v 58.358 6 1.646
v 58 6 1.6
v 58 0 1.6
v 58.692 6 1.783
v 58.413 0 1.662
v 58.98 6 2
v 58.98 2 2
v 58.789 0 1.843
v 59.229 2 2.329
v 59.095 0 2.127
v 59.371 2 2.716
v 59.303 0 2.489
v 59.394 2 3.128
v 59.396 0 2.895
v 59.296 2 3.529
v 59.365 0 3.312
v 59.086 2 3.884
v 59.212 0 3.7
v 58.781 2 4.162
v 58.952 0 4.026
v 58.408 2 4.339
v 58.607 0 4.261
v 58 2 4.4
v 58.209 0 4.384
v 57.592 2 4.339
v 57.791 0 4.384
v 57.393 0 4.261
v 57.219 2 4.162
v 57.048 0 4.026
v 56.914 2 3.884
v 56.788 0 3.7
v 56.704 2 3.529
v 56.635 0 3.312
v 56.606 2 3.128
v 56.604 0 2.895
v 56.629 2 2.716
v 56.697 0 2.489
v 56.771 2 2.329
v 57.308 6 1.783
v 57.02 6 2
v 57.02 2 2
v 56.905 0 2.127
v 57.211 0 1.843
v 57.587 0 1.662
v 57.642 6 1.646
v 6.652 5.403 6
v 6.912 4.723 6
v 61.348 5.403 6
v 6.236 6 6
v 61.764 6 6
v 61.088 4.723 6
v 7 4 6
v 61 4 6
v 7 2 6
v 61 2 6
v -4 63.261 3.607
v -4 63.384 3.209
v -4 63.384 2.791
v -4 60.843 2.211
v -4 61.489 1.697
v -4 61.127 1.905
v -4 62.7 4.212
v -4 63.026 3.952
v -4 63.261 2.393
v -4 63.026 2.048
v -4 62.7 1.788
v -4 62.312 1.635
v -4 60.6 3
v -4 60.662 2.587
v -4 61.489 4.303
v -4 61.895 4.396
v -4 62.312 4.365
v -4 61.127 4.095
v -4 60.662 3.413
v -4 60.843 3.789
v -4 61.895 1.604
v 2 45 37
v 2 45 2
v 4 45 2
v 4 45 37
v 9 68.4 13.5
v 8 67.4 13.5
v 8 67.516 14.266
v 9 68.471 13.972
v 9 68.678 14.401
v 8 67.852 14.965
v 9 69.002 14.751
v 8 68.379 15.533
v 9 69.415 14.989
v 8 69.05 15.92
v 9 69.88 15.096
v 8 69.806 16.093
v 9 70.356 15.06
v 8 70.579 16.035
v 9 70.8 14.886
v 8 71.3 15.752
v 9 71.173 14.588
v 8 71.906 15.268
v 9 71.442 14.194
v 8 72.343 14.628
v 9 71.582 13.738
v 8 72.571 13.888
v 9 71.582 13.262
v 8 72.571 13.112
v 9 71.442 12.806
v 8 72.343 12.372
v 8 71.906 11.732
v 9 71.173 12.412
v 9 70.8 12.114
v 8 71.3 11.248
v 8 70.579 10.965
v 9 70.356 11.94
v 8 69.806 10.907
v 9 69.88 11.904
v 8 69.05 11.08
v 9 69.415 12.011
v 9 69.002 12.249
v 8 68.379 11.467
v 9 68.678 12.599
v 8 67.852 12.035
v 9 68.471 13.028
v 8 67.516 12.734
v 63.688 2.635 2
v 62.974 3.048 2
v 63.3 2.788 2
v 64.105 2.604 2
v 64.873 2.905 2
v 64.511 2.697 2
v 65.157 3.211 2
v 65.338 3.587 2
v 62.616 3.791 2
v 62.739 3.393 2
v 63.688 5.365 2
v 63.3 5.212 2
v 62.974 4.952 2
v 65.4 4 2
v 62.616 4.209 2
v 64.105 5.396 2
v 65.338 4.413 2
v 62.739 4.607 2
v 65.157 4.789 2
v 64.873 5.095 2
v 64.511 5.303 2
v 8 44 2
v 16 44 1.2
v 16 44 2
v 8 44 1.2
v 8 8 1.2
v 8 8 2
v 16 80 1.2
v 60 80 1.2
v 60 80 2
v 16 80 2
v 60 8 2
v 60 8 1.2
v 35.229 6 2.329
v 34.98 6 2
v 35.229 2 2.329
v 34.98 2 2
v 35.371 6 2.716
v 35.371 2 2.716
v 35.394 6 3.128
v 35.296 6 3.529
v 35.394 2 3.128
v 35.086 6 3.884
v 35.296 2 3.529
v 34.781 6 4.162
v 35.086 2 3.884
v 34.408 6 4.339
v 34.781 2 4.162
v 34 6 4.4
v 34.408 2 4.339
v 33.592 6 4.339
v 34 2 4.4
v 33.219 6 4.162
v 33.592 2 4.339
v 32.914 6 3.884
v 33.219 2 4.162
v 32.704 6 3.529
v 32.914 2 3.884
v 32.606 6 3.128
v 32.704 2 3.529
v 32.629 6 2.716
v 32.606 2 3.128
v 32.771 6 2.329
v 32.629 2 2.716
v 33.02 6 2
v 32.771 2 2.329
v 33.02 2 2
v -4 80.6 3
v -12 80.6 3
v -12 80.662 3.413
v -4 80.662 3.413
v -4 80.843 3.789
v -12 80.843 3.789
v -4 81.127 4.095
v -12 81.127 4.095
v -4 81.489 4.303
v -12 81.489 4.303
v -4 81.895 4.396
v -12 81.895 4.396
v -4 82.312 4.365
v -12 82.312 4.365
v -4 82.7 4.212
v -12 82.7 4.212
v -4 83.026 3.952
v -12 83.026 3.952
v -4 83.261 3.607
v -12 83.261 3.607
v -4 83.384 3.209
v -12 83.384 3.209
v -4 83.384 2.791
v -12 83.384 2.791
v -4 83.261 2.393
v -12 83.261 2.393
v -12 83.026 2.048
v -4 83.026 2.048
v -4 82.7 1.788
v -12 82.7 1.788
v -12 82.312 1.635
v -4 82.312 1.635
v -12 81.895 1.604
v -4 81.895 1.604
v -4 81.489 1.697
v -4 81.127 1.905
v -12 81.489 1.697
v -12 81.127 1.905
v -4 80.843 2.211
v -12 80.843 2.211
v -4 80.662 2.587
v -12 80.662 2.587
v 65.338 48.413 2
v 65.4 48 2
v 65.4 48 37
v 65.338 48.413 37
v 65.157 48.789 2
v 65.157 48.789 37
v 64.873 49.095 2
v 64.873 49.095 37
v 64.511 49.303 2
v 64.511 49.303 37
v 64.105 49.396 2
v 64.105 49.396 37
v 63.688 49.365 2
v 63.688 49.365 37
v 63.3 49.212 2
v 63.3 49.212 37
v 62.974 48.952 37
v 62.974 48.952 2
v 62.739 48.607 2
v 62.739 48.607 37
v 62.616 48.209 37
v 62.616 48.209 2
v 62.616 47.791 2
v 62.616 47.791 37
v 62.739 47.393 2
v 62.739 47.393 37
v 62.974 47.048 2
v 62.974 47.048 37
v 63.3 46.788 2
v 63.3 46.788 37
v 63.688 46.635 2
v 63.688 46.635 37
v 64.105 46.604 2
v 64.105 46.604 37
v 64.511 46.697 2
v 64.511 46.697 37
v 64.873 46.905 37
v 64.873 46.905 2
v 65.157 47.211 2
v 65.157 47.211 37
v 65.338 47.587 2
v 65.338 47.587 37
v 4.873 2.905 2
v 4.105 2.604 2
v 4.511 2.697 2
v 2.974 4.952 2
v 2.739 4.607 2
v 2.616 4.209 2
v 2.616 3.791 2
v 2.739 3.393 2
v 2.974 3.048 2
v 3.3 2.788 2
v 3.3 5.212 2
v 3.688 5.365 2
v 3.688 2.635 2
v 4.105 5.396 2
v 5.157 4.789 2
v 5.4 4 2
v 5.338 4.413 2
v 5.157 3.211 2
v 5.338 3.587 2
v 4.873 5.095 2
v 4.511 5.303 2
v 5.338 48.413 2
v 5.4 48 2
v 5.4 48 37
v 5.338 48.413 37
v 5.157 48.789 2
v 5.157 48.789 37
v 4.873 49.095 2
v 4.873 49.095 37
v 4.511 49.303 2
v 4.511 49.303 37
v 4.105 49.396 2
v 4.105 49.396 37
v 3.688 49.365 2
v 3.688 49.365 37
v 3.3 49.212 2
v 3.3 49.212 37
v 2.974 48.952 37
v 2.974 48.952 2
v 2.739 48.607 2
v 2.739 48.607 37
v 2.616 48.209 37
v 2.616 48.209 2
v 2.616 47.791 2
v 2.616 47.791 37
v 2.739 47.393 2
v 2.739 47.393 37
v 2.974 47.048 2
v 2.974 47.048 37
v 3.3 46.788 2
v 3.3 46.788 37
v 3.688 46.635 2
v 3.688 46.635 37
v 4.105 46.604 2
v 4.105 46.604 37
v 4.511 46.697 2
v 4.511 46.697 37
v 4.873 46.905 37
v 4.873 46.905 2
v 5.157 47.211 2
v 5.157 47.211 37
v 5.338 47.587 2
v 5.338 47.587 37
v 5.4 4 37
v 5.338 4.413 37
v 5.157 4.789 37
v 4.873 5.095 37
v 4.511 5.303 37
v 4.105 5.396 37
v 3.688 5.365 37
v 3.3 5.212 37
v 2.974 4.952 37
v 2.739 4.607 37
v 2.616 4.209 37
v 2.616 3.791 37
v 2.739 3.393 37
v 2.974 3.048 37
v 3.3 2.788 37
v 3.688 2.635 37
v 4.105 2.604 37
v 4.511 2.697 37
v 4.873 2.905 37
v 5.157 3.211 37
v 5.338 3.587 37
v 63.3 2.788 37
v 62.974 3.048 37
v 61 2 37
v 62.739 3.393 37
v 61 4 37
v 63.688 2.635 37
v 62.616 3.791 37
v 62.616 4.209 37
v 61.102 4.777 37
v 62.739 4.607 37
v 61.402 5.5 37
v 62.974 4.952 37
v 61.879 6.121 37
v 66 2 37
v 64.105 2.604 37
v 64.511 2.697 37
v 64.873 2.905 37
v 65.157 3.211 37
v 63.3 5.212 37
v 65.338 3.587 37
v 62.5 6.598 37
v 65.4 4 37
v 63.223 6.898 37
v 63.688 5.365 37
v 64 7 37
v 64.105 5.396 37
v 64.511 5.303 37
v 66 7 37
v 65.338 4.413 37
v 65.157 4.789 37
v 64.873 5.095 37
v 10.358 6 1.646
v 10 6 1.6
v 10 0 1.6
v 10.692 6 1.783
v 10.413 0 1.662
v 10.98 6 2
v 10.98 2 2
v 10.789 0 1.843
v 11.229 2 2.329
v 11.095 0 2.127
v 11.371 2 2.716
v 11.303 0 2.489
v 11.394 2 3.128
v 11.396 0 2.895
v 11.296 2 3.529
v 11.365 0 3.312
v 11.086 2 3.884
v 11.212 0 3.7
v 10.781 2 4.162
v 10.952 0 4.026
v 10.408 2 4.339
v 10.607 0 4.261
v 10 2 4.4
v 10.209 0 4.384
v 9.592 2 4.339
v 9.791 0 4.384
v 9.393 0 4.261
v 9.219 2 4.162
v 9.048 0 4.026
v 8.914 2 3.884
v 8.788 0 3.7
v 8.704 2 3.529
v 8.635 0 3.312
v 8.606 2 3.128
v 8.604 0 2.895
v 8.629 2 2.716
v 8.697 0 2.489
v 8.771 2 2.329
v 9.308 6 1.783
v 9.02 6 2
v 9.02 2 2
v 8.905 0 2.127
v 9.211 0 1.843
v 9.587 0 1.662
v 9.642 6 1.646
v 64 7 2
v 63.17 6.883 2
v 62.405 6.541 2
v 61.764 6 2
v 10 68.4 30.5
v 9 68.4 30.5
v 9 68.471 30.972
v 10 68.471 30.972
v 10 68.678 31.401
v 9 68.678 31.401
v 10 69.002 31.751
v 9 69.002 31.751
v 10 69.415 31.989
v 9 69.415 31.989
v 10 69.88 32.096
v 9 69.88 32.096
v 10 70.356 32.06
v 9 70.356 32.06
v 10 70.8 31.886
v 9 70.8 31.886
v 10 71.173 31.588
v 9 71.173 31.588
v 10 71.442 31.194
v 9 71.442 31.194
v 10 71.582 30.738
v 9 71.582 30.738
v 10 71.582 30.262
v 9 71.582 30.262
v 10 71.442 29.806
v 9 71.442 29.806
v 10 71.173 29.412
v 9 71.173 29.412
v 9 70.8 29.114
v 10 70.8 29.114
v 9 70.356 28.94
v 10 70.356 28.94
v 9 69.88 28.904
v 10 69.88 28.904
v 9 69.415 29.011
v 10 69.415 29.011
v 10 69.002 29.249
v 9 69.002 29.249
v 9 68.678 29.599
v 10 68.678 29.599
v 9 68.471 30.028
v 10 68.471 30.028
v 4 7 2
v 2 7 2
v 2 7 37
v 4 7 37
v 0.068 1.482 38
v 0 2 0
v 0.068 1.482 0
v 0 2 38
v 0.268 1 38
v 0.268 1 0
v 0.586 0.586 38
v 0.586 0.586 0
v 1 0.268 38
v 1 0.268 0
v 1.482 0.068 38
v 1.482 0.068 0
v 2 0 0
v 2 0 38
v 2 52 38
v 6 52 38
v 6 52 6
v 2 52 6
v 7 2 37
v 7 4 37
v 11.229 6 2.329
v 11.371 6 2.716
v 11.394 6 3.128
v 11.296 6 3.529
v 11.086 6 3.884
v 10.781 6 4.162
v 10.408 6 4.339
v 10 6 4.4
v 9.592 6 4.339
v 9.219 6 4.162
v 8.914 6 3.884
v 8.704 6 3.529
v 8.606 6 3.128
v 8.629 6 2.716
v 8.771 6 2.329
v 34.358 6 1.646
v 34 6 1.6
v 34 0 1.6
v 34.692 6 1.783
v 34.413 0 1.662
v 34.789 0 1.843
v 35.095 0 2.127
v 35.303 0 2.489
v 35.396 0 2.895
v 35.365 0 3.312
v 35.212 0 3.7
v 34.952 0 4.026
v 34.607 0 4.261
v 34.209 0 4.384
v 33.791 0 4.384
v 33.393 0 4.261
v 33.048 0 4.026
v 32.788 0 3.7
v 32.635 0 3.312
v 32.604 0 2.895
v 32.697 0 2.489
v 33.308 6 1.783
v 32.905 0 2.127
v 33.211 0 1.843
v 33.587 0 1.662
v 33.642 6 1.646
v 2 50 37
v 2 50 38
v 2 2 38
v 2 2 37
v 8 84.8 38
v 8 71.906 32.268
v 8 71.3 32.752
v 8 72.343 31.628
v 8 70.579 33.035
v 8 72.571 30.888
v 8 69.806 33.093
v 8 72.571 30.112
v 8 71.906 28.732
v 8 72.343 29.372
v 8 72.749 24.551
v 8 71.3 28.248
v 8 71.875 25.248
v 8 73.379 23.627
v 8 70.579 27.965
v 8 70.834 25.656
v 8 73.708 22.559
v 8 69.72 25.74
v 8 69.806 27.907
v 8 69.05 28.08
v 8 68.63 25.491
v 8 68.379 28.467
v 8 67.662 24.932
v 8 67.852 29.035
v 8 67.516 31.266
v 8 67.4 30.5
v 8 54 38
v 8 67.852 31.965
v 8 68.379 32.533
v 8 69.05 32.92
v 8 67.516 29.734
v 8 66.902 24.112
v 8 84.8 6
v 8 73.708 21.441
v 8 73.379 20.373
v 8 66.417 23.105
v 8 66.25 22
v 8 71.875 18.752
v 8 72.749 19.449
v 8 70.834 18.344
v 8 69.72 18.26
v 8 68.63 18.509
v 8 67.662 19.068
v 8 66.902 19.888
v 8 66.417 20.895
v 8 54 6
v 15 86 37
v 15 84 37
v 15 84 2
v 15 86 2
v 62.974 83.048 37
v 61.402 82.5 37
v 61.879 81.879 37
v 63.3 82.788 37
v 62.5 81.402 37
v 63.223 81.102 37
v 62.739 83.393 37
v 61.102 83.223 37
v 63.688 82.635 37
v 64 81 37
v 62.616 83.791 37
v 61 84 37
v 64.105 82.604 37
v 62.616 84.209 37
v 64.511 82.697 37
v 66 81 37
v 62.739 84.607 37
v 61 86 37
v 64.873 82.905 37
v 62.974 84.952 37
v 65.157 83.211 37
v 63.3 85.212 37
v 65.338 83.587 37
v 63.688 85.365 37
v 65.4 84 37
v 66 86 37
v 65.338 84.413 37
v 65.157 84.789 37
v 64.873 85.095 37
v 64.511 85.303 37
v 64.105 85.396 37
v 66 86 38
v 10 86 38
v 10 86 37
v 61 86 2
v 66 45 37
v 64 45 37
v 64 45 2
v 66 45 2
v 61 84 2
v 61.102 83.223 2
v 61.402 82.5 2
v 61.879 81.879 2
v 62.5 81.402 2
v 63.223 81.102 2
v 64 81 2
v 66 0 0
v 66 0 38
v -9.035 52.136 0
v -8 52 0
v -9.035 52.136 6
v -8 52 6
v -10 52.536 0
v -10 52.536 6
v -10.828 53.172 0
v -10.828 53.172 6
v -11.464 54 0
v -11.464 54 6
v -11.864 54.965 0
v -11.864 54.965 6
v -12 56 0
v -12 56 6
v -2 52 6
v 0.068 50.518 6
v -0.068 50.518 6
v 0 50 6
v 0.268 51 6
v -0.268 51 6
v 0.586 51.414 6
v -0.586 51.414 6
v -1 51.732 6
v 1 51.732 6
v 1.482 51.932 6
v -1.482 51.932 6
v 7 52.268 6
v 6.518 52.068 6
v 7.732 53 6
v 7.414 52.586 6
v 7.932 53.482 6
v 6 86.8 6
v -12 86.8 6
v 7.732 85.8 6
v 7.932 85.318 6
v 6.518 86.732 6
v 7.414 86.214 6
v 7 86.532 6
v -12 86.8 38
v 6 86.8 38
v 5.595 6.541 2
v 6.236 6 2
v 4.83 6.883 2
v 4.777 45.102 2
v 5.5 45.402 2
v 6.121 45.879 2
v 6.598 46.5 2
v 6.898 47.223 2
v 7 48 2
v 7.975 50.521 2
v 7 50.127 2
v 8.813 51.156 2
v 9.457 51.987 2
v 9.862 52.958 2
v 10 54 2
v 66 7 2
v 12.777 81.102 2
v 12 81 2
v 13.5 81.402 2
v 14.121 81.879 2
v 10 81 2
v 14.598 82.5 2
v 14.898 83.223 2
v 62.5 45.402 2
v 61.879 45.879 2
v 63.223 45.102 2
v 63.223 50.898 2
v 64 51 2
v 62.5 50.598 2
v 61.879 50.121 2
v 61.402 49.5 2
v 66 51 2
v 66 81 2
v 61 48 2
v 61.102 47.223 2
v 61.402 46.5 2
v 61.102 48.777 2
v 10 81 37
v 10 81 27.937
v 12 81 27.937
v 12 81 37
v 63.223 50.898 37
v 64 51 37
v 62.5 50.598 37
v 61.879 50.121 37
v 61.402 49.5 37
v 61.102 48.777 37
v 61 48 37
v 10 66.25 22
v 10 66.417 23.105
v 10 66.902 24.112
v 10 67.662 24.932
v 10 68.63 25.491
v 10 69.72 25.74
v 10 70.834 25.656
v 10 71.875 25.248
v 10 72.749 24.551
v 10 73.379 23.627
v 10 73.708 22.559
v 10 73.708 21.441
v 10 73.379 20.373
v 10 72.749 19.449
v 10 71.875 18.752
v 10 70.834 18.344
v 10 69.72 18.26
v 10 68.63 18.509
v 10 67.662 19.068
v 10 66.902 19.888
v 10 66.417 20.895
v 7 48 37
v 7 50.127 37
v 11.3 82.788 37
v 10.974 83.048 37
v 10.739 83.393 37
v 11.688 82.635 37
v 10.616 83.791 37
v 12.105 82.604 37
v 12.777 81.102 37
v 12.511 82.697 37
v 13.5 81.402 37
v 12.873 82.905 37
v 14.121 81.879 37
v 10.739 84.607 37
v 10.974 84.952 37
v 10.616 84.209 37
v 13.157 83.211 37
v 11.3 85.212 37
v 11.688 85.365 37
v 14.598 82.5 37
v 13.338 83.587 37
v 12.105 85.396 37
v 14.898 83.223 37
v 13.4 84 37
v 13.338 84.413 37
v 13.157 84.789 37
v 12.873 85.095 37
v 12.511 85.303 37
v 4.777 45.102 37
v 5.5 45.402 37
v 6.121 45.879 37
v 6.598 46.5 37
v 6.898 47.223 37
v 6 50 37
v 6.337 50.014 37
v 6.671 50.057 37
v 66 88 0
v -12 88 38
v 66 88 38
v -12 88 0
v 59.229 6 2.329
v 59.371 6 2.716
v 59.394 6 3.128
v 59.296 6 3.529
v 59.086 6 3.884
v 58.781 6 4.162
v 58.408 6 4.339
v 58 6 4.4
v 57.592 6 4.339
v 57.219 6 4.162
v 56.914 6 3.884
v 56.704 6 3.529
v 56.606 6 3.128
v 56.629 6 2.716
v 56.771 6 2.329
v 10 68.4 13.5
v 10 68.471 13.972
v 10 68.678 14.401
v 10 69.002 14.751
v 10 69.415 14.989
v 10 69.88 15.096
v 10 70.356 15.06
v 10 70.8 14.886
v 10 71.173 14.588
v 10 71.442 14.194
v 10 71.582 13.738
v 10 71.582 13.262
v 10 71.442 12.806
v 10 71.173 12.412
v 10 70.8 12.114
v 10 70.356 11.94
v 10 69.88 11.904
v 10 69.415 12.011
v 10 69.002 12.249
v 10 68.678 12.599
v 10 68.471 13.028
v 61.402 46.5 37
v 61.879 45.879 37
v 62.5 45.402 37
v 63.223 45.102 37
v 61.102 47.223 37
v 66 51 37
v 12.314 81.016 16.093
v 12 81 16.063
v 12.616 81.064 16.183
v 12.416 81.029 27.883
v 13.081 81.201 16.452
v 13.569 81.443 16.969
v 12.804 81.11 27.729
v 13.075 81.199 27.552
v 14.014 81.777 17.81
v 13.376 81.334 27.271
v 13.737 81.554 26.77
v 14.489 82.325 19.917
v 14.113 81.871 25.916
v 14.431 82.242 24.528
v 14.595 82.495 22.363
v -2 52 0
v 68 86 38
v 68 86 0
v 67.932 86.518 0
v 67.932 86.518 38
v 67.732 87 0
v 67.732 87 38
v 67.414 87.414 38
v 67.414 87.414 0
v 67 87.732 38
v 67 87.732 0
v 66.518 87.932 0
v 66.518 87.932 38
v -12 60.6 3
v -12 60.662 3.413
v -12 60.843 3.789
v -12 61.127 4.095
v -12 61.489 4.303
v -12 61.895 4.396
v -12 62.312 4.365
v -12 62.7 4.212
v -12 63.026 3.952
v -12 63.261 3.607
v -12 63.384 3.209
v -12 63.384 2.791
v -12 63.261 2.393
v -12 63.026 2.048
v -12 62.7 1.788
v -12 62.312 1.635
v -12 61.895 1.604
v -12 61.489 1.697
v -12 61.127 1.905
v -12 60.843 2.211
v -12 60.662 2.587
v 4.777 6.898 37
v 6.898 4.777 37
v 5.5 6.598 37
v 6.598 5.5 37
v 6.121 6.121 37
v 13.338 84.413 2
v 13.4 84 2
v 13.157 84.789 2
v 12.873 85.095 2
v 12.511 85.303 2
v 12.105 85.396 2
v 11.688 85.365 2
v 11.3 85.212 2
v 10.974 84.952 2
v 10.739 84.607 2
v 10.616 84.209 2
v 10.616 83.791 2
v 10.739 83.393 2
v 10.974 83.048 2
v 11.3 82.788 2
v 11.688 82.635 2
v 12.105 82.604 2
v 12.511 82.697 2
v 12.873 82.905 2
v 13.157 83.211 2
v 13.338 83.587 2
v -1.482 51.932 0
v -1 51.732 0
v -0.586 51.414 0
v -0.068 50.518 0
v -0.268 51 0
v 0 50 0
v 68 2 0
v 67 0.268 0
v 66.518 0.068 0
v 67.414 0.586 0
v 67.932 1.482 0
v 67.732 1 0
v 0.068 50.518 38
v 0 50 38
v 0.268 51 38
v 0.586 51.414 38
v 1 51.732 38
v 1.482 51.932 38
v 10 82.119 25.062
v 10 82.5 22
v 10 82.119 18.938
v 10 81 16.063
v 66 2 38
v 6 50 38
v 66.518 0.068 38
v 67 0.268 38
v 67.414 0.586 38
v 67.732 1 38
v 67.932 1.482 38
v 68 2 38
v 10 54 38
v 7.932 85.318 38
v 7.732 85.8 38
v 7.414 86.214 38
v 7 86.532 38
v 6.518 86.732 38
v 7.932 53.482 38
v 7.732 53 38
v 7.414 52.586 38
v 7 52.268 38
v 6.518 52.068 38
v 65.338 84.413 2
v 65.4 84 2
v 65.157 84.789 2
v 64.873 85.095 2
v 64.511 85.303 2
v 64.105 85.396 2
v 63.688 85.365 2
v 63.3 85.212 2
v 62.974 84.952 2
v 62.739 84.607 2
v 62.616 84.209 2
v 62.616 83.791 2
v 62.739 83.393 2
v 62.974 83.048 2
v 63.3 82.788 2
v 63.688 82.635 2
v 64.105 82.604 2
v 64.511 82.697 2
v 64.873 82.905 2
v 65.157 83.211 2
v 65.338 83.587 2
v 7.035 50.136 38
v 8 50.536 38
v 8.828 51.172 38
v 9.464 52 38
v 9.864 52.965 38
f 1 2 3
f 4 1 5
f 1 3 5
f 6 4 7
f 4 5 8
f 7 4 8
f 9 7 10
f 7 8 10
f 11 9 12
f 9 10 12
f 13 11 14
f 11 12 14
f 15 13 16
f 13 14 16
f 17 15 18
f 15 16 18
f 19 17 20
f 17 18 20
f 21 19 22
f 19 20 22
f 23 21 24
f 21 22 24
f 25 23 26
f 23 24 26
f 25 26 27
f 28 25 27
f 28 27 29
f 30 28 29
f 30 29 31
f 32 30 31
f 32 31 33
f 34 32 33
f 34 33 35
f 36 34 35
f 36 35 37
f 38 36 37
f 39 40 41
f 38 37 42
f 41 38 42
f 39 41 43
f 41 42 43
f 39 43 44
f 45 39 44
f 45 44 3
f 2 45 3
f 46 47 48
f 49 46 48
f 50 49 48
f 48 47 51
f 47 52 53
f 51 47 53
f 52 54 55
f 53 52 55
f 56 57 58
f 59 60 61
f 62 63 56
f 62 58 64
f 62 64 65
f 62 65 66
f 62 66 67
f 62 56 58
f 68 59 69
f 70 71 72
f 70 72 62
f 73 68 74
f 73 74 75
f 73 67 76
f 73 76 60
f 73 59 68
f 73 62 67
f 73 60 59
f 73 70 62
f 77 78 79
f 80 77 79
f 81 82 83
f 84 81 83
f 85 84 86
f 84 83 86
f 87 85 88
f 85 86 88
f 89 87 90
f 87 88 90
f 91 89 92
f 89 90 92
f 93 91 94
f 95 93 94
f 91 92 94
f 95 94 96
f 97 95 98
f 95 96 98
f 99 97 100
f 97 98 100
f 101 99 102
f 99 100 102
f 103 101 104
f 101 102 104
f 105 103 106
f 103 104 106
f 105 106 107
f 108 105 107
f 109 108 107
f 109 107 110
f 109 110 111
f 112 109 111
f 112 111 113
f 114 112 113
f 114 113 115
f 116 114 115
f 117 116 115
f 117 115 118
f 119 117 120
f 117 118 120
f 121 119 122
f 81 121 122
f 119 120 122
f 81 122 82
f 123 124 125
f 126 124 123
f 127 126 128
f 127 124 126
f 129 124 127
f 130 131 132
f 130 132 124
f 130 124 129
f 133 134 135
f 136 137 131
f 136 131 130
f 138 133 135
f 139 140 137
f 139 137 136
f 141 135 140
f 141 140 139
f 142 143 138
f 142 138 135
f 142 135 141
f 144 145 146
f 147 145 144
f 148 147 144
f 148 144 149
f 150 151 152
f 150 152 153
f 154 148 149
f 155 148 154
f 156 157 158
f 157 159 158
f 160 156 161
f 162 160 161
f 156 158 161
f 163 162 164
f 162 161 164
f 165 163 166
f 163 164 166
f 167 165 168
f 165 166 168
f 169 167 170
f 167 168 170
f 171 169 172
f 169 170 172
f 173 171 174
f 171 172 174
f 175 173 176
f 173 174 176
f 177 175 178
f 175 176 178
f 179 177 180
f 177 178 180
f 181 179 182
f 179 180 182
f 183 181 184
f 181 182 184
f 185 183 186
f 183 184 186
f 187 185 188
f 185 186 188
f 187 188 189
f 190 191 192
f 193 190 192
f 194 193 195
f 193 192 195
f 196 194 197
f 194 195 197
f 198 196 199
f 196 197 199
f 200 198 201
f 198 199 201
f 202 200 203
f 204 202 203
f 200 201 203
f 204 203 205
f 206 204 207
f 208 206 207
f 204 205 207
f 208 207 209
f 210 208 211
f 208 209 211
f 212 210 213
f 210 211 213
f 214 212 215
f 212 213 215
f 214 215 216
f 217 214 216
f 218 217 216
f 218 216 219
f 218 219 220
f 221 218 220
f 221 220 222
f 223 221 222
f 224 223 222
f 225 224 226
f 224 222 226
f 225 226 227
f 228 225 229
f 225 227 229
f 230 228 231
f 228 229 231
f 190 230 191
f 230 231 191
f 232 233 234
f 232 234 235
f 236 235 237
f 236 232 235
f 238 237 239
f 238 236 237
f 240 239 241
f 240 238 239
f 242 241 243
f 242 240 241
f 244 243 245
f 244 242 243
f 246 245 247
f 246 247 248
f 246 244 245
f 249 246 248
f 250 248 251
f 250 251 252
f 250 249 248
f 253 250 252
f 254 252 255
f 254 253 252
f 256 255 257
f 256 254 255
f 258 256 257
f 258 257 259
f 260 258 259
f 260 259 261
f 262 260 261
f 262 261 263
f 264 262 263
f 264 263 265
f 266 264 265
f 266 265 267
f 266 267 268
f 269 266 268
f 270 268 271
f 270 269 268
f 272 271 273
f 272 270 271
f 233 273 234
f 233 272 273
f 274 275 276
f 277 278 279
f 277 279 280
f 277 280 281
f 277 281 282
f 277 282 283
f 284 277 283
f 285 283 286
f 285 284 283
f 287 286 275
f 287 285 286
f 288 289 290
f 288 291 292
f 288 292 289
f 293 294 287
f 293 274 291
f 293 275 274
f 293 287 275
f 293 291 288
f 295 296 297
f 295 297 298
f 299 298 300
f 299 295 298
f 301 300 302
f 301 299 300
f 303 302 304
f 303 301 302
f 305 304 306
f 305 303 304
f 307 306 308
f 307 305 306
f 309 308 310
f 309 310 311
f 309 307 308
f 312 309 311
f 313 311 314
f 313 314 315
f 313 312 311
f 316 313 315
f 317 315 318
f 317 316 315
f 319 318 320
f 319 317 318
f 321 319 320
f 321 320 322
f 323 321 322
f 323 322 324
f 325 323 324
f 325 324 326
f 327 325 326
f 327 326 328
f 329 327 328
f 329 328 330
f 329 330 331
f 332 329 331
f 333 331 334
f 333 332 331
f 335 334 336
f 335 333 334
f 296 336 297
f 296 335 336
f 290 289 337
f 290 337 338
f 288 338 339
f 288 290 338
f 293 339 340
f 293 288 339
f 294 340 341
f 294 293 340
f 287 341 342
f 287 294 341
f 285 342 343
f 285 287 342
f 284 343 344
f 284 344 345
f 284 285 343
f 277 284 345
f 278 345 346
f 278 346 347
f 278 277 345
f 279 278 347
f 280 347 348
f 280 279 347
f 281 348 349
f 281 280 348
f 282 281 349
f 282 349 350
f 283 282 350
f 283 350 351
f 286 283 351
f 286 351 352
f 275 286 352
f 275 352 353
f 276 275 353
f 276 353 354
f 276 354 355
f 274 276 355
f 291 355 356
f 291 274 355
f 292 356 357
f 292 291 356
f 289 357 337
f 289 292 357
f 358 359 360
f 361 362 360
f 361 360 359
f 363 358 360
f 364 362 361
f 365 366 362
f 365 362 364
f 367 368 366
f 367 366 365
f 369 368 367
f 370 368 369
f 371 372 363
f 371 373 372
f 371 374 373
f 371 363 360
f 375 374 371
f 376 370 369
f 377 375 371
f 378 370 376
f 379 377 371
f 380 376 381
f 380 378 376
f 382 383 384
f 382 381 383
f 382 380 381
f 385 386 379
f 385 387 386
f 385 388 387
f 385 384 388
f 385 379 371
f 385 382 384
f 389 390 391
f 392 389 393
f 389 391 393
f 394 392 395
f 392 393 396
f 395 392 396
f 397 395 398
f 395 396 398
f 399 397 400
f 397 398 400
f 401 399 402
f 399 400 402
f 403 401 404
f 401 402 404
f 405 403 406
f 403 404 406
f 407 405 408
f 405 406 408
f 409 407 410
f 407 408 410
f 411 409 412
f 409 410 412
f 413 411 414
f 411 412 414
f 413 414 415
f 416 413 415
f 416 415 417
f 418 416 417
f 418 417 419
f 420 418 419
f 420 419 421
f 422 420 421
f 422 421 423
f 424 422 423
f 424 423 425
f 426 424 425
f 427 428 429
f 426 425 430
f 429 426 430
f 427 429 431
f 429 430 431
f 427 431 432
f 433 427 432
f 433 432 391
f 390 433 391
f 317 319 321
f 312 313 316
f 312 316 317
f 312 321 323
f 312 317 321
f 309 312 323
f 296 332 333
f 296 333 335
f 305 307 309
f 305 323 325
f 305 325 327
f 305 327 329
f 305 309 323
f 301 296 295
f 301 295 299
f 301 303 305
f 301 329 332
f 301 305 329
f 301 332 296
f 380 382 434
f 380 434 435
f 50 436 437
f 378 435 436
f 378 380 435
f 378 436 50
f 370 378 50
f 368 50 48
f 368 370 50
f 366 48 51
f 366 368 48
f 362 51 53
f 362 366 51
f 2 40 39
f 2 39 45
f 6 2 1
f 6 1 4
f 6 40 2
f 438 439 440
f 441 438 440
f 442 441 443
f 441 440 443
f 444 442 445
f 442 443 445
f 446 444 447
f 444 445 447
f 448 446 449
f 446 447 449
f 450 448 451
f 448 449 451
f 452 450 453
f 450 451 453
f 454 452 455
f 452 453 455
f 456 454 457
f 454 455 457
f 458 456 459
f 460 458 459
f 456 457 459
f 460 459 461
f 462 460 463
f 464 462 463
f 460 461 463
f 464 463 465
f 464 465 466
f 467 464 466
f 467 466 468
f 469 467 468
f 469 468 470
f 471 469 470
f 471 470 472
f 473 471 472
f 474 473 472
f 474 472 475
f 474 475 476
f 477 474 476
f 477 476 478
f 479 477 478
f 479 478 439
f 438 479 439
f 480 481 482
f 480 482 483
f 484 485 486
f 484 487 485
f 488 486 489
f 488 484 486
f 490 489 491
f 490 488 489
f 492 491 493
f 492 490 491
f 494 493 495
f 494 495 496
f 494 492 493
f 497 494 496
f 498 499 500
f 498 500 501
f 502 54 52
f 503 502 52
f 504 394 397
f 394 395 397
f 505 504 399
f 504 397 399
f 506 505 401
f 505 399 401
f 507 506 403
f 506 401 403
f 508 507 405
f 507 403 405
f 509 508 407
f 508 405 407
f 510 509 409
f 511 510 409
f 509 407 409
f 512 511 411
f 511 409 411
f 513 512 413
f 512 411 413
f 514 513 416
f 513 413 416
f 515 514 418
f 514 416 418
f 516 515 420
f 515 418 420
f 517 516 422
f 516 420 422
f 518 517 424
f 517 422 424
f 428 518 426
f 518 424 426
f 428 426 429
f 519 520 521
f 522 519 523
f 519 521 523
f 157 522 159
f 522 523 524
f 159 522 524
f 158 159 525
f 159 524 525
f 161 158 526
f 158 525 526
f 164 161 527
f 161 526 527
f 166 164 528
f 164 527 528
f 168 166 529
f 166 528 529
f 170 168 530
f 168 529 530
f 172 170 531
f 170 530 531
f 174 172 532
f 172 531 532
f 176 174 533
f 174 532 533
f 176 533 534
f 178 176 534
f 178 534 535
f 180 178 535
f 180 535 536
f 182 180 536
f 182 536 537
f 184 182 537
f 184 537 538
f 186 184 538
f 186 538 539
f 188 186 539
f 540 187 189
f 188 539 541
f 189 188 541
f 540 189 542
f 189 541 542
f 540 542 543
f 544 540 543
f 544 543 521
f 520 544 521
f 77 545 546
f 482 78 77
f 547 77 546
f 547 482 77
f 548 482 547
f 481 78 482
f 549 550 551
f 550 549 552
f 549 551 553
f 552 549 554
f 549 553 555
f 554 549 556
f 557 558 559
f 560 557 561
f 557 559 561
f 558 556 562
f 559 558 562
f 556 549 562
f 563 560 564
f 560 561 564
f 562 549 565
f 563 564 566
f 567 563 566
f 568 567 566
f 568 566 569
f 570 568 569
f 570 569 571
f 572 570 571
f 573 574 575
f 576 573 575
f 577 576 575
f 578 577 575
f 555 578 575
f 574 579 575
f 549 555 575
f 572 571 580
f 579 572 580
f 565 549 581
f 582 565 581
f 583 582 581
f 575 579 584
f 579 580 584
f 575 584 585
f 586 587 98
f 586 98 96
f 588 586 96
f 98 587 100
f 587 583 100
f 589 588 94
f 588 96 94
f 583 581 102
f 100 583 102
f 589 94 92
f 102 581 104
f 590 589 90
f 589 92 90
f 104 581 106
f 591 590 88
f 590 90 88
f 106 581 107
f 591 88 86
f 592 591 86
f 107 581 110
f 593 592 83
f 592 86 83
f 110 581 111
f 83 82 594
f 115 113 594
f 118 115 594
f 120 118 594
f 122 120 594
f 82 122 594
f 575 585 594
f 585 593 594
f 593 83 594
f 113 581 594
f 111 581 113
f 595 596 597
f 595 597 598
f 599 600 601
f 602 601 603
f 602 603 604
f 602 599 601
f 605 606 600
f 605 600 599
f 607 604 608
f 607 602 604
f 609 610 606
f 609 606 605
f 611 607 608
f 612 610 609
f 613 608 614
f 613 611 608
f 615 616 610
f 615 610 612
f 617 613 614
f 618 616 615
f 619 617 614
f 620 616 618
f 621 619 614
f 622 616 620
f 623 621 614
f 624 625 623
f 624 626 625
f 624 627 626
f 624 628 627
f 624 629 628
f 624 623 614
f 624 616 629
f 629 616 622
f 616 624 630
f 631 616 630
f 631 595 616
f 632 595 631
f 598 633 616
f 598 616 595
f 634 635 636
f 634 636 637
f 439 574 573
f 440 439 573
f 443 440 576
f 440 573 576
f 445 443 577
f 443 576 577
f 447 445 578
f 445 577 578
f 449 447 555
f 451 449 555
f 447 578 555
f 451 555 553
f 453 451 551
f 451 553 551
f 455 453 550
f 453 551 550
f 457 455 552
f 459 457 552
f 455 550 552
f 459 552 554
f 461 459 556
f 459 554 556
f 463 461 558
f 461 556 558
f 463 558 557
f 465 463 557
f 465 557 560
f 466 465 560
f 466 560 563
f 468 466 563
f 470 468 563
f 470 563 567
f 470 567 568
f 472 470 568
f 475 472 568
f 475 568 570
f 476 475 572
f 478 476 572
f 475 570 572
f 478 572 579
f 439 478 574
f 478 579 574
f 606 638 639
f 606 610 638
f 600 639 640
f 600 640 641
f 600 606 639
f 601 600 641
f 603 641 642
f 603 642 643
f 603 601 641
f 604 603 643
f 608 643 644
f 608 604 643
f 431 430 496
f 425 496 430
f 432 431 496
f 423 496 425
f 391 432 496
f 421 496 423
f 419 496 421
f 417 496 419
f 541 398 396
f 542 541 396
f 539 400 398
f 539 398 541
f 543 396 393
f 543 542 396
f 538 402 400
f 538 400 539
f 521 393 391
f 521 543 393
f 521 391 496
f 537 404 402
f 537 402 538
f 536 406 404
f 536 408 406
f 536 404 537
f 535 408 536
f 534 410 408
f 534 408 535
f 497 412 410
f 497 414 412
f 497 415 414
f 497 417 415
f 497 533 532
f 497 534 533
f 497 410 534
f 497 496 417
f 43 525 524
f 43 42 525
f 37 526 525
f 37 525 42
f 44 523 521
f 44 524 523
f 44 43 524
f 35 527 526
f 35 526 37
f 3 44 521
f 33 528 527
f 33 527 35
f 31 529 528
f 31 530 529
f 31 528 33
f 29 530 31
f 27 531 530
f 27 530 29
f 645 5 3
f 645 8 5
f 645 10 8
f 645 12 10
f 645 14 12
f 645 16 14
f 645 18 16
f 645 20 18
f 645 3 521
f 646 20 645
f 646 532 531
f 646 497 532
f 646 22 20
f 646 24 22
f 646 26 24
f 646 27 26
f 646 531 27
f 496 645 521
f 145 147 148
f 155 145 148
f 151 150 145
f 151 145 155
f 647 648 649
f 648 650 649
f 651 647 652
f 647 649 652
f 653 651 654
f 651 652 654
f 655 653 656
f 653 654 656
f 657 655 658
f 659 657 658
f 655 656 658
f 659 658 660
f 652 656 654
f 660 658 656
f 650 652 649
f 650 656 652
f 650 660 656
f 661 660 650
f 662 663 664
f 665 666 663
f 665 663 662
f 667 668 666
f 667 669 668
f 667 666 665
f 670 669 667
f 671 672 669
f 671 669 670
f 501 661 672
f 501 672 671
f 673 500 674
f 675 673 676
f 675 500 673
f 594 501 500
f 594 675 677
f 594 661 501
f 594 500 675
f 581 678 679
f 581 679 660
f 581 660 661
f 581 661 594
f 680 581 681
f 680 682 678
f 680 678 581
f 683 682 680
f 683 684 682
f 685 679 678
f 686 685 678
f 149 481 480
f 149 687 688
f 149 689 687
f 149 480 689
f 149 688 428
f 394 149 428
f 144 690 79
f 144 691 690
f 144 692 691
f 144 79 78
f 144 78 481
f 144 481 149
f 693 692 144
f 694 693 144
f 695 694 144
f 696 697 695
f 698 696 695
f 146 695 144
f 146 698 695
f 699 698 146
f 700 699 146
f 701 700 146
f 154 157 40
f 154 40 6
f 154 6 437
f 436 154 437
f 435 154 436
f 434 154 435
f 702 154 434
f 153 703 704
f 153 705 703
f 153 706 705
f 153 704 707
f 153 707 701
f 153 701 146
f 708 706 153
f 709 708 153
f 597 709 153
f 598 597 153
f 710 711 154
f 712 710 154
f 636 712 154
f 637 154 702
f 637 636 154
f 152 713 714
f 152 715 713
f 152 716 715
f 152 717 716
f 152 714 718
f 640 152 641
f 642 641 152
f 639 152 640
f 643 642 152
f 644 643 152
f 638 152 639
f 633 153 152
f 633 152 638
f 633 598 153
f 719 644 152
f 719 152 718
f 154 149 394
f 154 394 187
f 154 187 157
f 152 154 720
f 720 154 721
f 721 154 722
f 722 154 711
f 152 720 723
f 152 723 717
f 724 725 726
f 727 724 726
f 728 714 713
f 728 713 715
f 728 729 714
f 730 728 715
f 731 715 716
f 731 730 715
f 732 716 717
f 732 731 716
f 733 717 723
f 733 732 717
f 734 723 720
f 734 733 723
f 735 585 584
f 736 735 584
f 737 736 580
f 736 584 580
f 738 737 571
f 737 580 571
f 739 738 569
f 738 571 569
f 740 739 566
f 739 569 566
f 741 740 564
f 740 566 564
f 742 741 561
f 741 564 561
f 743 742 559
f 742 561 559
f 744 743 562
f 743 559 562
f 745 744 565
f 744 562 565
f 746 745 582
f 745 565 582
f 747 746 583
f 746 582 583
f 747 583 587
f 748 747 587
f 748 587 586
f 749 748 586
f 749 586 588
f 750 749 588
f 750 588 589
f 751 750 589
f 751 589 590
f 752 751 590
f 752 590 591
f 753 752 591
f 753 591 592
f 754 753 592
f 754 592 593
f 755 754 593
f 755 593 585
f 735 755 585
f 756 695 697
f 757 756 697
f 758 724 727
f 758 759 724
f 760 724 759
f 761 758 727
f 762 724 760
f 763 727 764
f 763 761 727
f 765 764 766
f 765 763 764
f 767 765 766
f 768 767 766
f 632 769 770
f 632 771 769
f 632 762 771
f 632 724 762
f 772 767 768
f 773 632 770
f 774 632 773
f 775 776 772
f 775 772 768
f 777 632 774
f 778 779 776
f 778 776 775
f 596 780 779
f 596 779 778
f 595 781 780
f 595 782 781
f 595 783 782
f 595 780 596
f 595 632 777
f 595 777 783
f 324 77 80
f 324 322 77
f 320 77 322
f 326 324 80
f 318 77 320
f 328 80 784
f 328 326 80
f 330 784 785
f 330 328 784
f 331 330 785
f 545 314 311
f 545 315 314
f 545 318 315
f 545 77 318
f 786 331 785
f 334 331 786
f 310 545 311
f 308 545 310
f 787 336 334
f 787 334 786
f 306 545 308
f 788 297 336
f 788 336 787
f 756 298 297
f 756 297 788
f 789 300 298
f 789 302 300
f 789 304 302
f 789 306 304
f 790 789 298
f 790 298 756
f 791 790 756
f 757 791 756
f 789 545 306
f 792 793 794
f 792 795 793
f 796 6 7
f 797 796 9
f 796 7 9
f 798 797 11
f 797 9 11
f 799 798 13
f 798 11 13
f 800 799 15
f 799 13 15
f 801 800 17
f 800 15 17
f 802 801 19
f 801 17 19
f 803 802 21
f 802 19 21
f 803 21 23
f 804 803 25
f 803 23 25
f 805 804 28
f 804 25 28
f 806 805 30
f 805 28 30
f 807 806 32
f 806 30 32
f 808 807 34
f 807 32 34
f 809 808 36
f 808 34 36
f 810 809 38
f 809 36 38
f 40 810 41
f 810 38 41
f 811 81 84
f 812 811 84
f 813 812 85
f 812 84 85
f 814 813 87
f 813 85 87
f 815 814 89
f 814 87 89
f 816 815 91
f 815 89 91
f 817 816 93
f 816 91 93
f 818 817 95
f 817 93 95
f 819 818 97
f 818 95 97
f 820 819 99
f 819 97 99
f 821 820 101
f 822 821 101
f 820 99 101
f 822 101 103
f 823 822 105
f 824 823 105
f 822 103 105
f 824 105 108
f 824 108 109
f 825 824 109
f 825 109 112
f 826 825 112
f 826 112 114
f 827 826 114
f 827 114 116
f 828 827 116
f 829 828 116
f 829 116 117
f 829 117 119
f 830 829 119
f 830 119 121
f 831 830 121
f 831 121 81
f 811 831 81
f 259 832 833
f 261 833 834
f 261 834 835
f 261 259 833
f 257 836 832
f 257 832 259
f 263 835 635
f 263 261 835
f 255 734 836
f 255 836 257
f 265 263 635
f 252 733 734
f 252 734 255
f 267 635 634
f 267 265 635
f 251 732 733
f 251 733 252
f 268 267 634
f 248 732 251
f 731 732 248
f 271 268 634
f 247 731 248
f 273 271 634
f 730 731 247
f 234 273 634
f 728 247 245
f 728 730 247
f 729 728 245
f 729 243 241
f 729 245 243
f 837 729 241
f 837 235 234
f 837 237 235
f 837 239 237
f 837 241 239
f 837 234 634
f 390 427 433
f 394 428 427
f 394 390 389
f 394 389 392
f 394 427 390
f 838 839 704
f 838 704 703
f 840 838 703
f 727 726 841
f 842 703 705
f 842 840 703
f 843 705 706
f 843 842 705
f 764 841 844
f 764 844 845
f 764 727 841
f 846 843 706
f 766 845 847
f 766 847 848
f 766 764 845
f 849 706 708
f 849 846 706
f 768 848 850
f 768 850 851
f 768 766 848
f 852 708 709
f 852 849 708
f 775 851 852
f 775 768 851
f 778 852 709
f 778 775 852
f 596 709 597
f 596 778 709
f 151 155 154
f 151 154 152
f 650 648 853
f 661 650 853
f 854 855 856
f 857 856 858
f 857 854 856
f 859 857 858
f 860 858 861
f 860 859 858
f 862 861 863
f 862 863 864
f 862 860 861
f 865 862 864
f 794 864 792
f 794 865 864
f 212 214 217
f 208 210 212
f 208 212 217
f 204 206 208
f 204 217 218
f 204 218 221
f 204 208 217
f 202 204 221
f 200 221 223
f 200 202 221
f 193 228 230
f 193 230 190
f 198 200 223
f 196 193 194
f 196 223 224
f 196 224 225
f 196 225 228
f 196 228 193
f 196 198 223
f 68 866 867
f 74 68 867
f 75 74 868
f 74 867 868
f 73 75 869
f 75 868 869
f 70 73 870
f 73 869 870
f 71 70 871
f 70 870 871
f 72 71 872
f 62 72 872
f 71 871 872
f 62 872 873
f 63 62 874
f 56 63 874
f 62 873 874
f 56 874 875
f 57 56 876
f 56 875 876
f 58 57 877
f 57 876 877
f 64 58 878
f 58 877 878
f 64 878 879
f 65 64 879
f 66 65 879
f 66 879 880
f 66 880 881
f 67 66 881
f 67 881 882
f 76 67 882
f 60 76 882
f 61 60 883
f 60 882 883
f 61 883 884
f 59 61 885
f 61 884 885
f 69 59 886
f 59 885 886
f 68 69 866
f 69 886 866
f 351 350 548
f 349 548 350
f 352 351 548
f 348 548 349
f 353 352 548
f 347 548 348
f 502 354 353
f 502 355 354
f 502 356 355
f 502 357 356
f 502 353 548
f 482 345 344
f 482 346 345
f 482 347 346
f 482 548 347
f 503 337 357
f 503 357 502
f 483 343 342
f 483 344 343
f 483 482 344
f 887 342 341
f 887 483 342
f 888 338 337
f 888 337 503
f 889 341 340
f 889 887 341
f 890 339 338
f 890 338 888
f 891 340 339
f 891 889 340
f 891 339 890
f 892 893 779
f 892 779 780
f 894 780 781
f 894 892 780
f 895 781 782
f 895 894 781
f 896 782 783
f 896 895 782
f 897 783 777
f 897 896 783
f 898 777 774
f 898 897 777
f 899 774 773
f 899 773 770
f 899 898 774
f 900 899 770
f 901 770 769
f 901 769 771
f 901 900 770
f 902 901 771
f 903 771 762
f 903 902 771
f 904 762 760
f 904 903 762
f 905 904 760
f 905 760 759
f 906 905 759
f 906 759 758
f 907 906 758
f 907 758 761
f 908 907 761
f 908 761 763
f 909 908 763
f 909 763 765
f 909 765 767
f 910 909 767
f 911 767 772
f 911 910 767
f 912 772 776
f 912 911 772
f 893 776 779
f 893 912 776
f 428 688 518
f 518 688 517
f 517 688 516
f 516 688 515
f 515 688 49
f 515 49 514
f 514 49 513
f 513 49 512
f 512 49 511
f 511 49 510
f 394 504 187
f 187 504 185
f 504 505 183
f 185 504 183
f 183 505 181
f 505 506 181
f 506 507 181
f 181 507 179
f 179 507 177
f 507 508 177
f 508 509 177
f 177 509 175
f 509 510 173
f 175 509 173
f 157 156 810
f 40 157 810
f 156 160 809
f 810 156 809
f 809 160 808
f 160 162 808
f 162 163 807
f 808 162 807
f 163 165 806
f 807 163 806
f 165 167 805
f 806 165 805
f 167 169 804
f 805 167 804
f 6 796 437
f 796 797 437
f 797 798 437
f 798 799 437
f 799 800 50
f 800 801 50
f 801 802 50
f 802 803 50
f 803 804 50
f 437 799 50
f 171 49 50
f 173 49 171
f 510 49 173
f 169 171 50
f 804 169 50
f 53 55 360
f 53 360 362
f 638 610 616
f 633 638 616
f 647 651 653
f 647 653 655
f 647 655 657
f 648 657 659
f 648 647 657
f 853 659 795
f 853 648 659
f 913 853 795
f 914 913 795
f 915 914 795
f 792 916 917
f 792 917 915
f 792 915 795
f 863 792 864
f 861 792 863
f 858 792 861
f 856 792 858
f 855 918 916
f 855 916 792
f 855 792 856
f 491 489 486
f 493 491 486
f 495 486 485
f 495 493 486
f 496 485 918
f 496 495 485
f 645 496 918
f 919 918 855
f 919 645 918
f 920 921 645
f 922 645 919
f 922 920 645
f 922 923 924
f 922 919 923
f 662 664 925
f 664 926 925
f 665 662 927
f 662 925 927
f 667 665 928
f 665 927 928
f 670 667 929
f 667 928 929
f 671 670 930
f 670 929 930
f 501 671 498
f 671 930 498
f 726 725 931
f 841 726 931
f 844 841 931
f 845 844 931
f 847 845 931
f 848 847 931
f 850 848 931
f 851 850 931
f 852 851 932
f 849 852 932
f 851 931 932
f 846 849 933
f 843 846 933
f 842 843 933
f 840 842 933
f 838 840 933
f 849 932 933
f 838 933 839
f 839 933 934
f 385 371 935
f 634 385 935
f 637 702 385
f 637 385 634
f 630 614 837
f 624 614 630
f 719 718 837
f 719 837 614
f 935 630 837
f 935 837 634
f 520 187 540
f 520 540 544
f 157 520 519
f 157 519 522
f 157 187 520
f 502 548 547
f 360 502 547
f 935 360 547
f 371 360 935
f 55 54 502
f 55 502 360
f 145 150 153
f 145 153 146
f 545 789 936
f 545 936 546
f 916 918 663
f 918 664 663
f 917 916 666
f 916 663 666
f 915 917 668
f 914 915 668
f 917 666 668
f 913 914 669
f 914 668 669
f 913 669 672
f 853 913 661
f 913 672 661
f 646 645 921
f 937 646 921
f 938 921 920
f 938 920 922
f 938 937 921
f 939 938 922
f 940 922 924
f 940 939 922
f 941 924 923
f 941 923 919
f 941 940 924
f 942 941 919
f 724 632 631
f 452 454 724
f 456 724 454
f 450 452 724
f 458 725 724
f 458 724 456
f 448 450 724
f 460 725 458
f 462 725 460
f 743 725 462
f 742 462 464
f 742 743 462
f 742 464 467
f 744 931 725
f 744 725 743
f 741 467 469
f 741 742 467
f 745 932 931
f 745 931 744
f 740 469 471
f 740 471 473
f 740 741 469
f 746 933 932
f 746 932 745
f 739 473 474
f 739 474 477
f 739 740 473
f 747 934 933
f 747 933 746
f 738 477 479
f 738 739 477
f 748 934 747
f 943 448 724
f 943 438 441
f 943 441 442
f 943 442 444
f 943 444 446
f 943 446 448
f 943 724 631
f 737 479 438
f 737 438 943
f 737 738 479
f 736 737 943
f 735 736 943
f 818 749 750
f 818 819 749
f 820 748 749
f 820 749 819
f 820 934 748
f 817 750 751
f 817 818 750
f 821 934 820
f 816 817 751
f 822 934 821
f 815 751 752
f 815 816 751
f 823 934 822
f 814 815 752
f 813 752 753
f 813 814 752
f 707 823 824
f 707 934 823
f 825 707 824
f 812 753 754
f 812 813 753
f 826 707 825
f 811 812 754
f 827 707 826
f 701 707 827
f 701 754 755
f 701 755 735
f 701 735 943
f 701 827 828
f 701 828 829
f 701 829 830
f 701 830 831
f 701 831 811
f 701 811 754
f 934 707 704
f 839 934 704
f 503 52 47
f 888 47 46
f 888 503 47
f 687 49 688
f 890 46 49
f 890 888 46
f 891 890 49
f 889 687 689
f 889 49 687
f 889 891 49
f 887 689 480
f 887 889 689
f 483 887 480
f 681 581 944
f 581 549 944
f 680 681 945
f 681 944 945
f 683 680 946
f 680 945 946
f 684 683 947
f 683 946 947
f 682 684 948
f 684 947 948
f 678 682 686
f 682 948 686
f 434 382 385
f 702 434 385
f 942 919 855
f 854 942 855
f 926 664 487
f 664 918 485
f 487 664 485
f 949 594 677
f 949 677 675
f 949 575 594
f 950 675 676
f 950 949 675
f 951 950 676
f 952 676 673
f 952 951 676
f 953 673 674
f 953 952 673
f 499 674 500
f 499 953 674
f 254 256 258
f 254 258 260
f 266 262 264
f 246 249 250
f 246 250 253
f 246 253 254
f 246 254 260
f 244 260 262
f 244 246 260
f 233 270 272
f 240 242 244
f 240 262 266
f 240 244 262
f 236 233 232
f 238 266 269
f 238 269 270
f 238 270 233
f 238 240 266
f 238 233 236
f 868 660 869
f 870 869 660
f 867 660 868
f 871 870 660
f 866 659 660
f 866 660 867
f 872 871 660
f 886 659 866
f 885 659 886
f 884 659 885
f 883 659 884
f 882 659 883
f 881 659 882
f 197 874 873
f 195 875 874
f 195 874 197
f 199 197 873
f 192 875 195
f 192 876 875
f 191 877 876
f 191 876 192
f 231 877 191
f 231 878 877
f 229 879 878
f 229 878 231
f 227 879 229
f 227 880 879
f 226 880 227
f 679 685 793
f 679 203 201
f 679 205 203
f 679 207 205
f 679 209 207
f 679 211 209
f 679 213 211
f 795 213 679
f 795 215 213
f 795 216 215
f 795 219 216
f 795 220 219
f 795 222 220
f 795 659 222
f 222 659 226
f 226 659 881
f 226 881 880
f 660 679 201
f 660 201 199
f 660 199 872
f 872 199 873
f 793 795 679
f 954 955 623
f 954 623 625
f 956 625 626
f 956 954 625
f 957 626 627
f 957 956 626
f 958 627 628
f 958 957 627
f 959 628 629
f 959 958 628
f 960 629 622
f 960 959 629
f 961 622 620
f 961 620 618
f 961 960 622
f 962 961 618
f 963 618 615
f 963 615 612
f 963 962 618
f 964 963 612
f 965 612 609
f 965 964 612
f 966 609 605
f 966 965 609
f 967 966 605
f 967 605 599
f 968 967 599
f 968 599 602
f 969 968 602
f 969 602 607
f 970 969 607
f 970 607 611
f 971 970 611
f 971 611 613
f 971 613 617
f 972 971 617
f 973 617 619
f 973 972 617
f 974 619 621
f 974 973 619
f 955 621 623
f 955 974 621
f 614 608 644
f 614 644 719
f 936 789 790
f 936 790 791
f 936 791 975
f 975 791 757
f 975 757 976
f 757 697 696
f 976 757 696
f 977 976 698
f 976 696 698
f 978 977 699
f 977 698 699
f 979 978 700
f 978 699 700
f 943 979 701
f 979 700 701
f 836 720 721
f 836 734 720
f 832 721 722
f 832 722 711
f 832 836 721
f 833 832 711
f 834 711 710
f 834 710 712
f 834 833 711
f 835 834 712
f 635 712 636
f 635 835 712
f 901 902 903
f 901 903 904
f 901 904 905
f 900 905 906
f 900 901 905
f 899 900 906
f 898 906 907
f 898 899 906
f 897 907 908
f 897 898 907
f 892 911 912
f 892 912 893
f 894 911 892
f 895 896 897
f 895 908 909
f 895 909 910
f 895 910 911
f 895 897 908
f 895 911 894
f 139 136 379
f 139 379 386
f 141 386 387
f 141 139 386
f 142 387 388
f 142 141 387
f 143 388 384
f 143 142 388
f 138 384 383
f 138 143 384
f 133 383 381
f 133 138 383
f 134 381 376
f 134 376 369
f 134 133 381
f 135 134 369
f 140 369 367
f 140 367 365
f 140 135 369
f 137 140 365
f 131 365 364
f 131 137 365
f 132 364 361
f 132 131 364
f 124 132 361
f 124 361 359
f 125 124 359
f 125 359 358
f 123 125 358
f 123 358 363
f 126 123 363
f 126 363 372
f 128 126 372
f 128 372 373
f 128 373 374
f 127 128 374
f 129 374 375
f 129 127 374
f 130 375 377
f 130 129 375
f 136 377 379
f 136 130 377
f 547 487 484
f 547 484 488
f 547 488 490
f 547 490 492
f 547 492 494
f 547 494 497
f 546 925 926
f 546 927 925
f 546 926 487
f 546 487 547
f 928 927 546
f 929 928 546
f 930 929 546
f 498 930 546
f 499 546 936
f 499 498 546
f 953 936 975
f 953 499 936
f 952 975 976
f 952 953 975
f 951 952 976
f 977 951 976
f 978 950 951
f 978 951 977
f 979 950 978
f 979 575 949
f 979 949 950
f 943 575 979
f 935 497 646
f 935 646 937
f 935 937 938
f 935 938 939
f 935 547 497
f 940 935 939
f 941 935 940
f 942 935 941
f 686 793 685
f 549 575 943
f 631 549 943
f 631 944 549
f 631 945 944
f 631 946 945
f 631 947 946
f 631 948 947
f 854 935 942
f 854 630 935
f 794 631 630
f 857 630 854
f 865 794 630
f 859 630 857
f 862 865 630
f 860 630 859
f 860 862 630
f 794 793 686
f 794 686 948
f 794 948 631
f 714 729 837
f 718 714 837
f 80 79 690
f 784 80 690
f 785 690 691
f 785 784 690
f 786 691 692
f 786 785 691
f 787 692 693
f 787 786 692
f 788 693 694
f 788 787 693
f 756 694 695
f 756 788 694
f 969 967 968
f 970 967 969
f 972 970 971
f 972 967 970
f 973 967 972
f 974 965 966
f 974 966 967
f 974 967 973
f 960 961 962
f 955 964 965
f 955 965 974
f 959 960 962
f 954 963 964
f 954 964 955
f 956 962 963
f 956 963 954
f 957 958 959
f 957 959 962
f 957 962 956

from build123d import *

# Parameters (mm, degrees)
EXTRUDE_1_DEPTH     = 38
SHELL_1_T           = -2
SKETCH_9_W          = 20
SKETCH_9_H          = 34.8
EXTRUDE_3_DEPTH     = 6
SKETCH_9_3_W        = 20
SKETCH_9_3_H        = 1.2
EXTRUDE_4_DEPTH     = 38
FILLET_1_R          = 2
FILLET_2_R          = 4
FILLET_4_R          = 2
SKETCH_3_W          = 6
SKETCH_3_H          = 6
SKETCH_3_R          = 1.4
EXTRUDE_2_DEPTH     = 35
FILLET_3_R          = 3
SKETCH_2_R          = 3.75
SKETCH_2_R_2        = 1.6
CUT_EXTRUDE_1_DEPTH = 30
CHAMFER_1_SIZE      = 1
CUT_EXTRUDE_START   = -2
SKETCH_2_3_R        = 12.5
CUT_EXTRUDE_2_DEPTH = 5
CUT_EXTRUDE_START_2 = 1.2
CUT_EXTRUDE_4_DEPTH = 10
SKETCH_10_R         = 1.4
CUT_EXTRUDE_5_DEPTH = 8
SKETCH_11_W         = 56
SKETCH_11_H         = 6
SKETCH_11_R         = 1.4
EXTRUDE_5_DEPTH     = 6
SKETCH_11_2_R       = 1.4
CUT_EXTRUDE_6_DEPTH = 6


with BuildPart() as part:
    # 草图1 → 凸台-拉伸1 (new body)
    with BuildSketch(Plane.XY):
        Polygon((0, 0), (68, 0), (68, 88), (8, 88), (8, 52), (0, 52), align=None)
    extrude(amount=EXTRUDE_1_DEPTH)

    # 抽壳1
    shell_1_openings = [part.faces().sort_by_distance(p)[0] for p in [
        (35.516853933, 42.685393258, 38),
    ]]
    offset(amount=SHELL_1_T, openings=shell_1_openings, kind=Kind.INTERSECTION)

    # 草图9 → 凸台-拉伸3 (add)
    with BuildSketch(Plane.XY):
        with Locations((-2, 69.4)):
            Rectangle(SKETCH_9_W, SKETCH_9_H)
    extrude(amount=EXTRUDE_3_DEPTH)

    # 草图9<3> → 凸台-拉伸4 (add)
    with BuildSketch(Plane.XY):
        with Locations((-2, 87.4)):
            Rectangle(SKETCH_9_3_W, SKETCH_9_3_H)
    extrude(amount=EXTRUDE_4_DEPTH)

    # 圆角1
    fillet_1_edges = [part.edges().sort_by_distance(p)[0] for p in [
        (0, 0, 19),
        (8, 52, 22),
        (68, 88, 19),
        (68, 0, 19),
        (0, 52, 3),
        (8, 86.8, 22),
    ]]
    fillet(fillet_1_edges, radius=FILLET_1_R)

    # 圆角2
    fillet_2_edges = [part.edges().sort_by_distance(p)[0] for p in [
        (10, 50, 20),
        (-12, 52, 3),
    ]]
    fillet(fillet_2_edges, radius=FILLET_2_R)

    # 圆角4
    fillet_4_edges = [part.edges().sort_by_distance(p)[0] for p in [
        (0, 52, 22),
    ]]
    fillet(fillet_4_edges, radius=FILLET_4_R)

    # 草图3 → 凸台-拉伸2 (add)
    # profile 1 of 6: a face of its own
    with BuildSketch(Plane.XY.offset(2)):
        with Locations((64, 84)):
            Rectangle(SKETCH_3_W, SKETCH_3_H)
        with Locations((64, 84)):
            Circle(SKETCH_3_R, mode=Mode.SUBTRACT)
    # profile 2 of 6: a face of its own
    with BuildSketch(Plane.XY.offset(2)):
        with Locations((12, 84)):
            Rectangle(SKETCH_3_W, SKETCH_3_H)
        with Locations((12, 84)):
            Circle(SKETCH_3_R, mode=Mode.SUBTRACT)
    # profile 3 of 6: a face of its own
    with BuildSketch(Plane.XY.offset(2)):
        with Locations((64, 4)):
            Rectangle(SKETCH_3_W, SKETCH_3_H)
        with Locations((64, 4)):
            Circle(SKETCH_3_R, mode=Mode.SUBTRACT)
    # profile 4 of 6: a face of its own
    with BuildSketch(Plane.XY.offset(2)):
        with Locations((4, 48)):
            Rectangle(SKETCH_3_W, SKETCH_3_H)
        with Locations((4, 48)):
            Circle(SKETCH_3_R, mode=Mode.SUBTRACT)
    # profile 5 of 6: a face of its own
    with BuildSketch(Plane.XY.offset(2)):
        with Locations((4, 4)):
            Rectangle(SKETCH_3_W, SKETCH_3_H)
        with Locations((4, 4)):
            Circle(SKETCH_3_R, mode=Mode.SUBTRACT)
    # profile 6 of 6: a face of its own
    with BuildSketch(Plane.XY.offset(2)):
        with Locations((64, 48)):
            Rectangle(SKETCH_3_W, SKETCH_3_H)
        with Locations((64, 48)):
            Circle(SKETCH_3_R, mode=Mode.SUBTRACT)
    extrude(amount=EXTRUDE_2_DEPTH)

    # 圆角3
    fillet_3_edges = [part.edges().sort_by_distance(p)[0] for p in [
        (15, 81, 19.5),
        (61, 81, 19.5),
        (61, 7, 19.5),
        (7, 45, 19.5),
        (7, 7, 19.5),
        (61, 45, 19.5),
        (61, 51, 19.5),
    ]]
    fillet(fillet_3_edges, radius=FILLET_3_R - 0.0001)  # a hair under: the kernel refuses the full size

    # 草图2 → 切除-拉伸1 (cut)
    with BuildSketch(Plane.ZY.offset(-8)):
        with Locations(Location((22, 70, 0), (0, 0, 270))):
            Circle(SKETCH_2_R)
        with Locations(Location((30.5, 70, 0), (0, 0, 270))):
            Circle(SKETCH_2_R_2)
        with Locations(Location((13.5, 70, 0), (0, 0, 270))):
            Circle(SKETCH_2_R_2)
    extrude(amount=-CUT_EXTRUDE_1_DEPTH, mode=Mode.SUBTRACT)

    # 倒角1
    chamfer_1_edges = [part.edges().sort_by_distance(p)[0] for p in [
        (8, 71.6, 13.5),
        (8, 71.6, 30.5),
    ]]
    chamfer(chamfer_1_edges, length=CHAMFER_1_SIZE)

    # 草图2<3> → 切除-拉伸2 (cut)
    with BuildSketch(Plane.ZY.offset(-8).offset(CUT_EXTRUDE_START)):
        with Locations((22, 70)):
            Circle(SKETCH_2_3_R)
    extrude(amount=-CUT_EXTRUDE_2_DEPTH, mode=Mode.SUBTRACT)

    # 草图1<3> → 切除-拉伸4 (cut)
    with BuildSketch(Plane.XY.offset(CUT_EXTRUDE_START_2)):
        Polygon((8, 44), (8, 8), (60, 8), (60, 80), (16, 80), (16, 44), align=None)
    extrude(amount=CUT_EXTRUDE_4_DEPTH, mode=Mode.SUBTRACT)

    # 草图10 → 切除-拉伸5 (cut)
    with BuildSketch(Plane.ZY.offset(12)):
        with Locations(Location((3, 82, 0), (0, 0, 270))):
            Circle(SKETCH_10_R)
        with Locations(Location((3, 62, 0), (0, 0, 270))):
            Circle(SKETCH_10_R)
    extrude(amount=-CUT_EXTRUDE_5_DEPTH, mode=Mode.SUBTRACT)

    # 草图11 → 凸台-拉伸5 (add)
    with BuildSketch(Plane.XZ):
        with Locations((34, 3)):
            Rectangle(SKETCH_11_W, SKETCH_11_H)
        with Locations((10, 3)):
            Circle(SKETCH_11_R, mode=Mode.SUBTRACT)
        with Locations((34, 3)):
            Circle(SKETCH_11_R, mode=Mode.SUBTRACT)
        with Locations((58, 3)):
            Circle(SKETCH_11_R, mode=Mode.SUBTRACT)
    extrude(amount=-EXTRUDE_5_DEPTH)

    # 草图11<2> → 切除-拉伸6 (cut)
    with BuildSketch(Plane.XZ):
        with Locations(Location((10, 3, 0), (0, 0, 270))):
            Circle(SKETCH_11_2_R)
        with Locations(Location((58, 3, 0), (0, 0, 270))):
            Circle(SKETCH_11_2_R)
        with Locations(Location((34, 3, 0), (0, 0, 270))):
            Circle(SKETCH_11_2_R)
    extrude(amount=-CUT_EXTRUDE_6_DEPTH, mode=Mode.SUBTRACT)


solid = part.part
